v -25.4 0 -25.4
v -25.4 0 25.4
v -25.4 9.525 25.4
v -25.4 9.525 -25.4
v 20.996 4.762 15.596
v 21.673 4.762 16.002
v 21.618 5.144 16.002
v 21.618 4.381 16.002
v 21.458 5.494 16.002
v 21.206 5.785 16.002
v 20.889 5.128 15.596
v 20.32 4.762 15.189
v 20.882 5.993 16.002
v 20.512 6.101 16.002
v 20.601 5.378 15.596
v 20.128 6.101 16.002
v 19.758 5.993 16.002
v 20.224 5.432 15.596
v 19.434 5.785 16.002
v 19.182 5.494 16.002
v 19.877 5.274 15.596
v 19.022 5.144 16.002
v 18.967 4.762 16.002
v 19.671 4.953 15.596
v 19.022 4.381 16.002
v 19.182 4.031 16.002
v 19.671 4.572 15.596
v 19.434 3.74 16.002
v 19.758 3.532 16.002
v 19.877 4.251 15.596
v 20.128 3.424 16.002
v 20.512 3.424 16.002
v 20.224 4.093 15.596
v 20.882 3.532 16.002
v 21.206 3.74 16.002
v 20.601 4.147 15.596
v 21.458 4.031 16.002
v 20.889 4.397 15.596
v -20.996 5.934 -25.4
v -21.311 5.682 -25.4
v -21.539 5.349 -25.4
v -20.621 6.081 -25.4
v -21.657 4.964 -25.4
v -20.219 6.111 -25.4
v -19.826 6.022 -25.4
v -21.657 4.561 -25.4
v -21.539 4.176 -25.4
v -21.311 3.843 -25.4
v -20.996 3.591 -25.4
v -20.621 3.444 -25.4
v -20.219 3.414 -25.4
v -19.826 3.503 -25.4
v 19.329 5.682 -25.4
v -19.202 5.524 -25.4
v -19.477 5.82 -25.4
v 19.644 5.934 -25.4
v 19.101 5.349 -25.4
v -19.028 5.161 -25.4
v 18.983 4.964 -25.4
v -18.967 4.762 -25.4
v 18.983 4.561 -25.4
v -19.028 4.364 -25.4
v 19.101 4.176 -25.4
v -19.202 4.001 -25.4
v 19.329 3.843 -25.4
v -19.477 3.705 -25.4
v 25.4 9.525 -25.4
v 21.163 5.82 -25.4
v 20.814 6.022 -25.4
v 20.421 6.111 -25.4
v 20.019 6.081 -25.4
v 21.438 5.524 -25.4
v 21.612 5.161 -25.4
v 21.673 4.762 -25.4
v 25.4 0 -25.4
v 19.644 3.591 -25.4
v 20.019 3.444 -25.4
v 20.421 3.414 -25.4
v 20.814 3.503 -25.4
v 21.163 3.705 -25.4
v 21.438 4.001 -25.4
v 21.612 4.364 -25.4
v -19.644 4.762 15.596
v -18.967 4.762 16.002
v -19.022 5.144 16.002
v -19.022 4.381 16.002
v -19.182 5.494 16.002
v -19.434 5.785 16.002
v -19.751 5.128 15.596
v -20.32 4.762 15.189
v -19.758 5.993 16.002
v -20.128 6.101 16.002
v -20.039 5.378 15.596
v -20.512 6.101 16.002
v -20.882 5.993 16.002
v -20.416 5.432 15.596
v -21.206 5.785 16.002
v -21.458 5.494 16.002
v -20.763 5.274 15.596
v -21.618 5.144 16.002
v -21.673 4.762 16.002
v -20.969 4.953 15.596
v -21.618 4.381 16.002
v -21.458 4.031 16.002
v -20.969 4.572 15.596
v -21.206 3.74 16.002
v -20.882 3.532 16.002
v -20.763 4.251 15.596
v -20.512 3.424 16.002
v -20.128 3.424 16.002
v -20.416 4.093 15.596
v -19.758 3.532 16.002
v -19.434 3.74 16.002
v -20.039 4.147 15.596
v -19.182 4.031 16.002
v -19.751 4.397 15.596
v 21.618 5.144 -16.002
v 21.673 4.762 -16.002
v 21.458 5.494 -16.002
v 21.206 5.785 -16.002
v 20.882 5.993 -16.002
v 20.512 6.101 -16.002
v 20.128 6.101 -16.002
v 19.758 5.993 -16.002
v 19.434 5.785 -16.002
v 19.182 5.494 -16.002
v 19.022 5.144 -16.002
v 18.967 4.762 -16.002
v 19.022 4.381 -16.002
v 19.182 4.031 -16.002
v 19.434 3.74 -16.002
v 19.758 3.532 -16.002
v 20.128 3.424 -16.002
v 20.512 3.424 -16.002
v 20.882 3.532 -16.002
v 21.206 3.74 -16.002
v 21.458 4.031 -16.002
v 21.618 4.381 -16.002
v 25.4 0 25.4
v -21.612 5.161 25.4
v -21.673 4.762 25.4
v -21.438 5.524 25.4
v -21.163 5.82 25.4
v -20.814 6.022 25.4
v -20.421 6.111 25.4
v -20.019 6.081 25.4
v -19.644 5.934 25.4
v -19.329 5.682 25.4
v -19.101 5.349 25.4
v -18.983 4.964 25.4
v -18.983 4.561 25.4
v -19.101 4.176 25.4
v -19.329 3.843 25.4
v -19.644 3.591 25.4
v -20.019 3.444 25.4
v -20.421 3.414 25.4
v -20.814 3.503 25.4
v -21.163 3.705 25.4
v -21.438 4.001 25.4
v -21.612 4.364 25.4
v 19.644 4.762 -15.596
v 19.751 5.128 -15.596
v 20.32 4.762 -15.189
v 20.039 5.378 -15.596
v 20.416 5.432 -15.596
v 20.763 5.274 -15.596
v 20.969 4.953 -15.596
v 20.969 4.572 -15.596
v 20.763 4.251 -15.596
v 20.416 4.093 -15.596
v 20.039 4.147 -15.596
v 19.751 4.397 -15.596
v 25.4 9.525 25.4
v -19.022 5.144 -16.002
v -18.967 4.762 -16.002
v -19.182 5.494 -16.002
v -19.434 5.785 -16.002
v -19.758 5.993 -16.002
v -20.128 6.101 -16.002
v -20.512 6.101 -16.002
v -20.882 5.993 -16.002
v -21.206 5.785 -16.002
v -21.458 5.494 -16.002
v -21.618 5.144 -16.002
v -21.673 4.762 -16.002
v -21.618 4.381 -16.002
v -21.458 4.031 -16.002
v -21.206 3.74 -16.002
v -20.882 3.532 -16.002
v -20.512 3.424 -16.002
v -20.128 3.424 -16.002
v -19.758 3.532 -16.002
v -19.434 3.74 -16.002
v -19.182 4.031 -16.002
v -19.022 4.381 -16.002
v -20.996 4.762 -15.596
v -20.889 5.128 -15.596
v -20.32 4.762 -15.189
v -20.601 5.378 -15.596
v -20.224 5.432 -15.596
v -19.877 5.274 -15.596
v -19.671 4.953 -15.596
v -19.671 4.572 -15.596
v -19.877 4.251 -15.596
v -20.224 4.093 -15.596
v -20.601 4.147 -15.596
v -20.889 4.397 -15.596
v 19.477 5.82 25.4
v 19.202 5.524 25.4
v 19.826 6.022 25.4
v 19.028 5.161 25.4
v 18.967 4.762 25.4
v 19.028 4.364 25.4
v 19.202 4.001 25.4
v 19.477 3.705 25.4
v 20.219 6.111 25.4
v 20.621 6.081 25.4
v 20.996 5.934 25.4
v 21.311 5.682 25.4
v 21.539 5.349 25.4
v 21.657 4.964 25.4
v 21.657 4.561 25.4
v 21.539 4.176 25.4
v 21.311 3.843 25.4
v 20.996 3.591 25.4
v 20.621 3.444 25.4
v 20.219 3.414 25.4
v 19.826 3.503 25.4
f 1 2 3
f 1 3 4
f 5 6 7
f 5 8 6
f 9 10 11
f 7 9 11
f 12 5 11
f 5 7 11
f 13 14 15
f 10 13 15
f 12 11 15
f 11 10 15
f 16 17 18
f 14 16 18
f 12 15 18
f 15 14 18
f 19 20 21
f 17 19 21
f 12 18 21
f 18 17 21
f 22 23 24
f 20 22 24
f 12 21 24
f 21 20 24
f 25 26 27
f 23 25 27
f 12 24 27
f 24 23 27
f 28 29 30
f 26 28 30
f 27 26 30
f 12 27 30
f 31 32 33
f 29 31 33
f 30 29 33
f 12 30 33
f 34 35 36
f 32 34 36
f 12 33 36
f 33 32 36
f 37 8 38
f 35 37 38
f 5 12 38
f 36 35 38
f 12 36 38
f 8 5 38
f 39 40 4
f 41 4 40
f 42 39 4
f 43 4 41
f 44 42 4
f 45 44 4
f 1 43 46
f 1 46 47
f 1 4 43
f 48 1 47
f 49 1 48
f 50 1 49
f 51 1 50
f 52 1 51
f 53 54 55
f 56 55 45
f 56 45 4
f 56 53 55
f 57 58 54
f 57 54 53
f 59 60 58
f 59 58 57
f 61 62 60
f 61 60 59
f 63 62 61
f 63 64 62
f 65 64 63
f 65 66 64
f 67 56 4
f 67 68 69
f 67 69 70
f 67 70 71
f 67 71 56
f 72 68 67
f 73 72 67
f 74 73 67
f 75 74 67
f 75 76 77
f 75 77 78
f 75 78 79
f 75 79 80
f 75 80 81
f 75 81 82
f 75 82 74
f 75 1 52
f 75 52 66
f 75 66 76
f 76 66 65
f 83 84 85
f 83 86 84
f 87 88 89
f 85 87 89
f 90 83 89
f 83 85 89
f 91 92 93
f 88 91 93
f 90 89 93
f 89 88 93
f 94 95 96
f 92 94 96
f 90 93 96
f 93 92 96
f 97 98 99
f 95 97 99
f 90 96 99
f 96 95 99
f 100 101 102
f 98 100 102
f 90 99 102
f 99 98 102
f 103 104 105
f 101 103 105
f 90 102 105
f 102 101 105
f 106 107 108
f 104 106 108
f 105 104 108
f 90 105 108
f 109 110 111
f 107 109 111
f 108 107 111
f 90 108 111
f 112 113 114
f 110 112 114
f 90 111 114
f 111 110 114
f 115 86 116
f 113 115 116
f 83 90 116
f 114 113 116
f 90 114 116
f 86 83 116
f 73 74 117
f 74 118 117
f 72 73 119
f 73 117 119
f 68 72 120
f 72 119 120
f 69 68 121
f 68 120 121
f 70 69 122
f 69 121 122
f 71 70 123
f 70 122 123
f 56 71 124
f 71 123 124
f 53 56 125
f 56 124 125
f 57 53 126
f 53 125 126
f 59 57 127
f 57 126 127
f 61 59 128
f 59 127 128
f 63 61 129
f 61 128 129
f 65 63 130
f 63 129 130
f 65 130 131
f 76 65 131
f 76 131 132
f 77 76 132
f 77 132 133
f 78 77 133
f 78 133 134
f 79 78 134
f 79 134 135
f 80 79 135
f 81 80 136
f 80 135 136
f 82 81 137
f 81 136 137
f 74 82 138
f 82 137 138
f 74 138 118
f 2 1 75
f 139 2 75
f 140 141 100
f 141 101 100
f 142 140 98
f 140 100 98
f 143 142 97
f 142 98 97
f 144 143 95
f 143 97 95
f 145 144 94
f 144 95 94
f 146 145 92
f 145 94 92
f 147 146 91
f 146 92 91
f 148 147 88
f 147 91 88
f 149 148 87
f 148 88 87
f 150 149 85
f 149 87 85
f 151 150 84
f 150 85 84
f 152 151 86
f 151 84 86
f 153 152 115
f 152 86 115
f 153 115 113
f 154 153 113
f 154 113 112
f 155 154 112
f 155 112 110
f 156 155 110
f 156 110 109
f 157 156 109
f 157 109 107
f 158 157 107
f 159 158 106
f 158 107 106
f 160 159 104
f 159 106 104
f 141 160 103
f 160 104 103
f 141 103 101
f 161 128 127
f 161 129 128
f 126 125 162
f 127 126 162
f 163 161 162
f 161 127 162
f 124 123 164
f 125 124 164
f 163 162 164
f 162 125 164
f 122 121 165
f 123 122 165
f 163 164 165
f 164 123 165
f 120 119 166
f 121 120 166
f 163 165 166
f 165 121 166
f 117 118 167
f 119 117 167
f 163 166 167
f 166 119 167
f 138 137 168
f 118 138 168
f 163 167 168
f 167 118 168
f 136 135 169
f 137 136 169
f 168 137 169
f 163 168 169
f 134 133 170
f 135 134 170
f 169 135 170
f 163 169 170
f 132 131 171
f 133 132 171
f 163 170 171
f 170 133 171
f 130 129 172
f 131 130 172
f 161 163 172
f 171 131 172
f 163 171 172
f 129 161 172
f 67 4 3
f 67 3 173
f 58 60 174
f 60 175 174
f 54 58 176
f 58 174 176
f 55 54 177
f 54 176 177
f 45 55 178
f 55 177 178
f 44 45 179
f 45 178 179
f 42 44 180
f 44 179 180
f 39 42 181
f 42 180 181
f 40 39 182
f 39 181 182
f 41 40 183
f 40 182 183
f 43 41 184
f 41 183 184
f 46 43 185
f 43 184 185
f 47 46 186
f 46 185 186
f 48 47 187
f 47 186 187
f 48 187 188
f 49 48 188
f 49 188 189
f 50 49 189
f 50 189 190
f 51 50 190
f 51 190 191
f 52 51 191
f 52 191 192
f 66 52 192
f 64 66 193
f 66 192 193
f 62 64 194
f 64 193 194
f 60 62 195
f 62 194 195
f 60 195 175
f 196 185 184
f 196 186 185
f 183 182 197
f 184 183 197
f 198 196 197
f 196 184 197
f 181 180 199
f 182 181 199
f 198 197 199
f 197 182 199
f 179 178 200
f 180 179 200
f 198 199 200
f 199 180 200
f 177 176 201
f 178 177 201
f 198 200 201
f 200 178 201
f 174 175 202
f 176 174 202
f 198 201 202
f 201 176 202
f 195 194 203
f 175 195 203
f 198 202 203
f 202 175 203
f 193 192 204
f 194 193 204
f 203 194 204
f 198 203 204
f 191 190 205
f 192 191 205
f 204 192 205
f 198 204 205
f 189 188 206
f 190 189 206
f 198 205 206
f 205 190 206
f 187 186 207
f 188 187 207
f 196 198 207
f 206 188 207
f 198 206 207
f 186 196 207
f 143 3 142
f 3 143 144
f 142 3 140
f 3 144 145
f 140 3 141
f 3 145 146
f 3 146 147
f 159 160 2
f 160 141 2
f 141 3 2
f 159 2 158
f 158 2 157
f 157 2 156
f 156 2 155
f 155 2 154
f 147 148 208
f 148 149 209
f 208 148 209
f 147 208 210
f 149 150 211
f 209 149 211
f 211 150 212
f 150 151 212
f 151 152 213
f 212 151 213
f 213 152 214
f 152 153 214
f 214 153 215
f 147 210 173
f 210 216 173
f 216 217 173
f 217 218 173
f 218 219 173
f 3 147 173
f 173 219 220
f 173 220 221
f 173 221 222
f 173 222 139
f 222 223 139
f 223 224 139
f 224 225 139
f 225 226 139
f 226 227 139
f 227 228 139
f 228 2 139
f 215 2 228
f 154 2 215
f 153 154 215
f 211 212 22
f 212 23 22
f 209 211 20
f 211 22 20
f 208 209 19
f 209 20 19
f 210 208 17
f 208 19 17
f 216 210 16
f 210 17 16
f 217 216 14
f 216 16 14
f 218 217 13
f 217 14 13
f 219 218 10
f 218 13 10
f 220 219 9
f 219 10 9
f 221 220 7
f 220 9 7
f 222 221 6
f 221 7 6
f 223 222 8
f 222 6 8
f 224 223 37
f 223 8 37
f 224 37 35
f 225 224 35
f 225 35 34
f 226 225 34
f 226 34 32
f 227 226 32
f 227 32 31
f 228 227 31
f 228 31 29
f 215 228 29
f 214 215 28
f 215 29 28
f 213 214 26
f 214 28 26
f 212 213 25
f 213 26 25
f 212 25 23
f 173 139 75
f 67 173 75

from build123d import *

# Parameters (mm, degrees)
SKETCH2_W                 = 50.8
SKETCH2_H                 = 50.8
BOSS_EXTRUDE1_DEPTH       = 9.525
F_6_32_TAPPED_HOLE1_D     = 2.7051
F_6_32_TAPPED_HOLE1_DEPTH = 9.398
F_6_32_TAPPED_HOLE1_TIP   = 0.81269403
F_6_32_TAPPED_HOLE2_D     = 2.7051
F_6_32_TAPPED_HOLE2_DEPTH = 9.398
F_6_32_TAPPED_HOLE2_TIP   = 0.81269403


with BuildPart() as part:
    # Sketch2 → Boss-Extrude1 (new body)
    with BuildSketch(Plane(origin=(0, 0, 0), x_dir=(1, 0, 0), z_dir=(0, 1, 0))):
        Rectangle(SKETCH2_W, SKETCH2_H)
    extrude(amount=BOSS_EXTRUDE1_DEPTH)

    # #6-32 Tapped Hole1
    with Locations(Plane.XY.offset(25.4)):
        with Locations((-20.32, 4.7625), (20.32, 4.7625)):
            Hole(F_6_32_TAPPED_HOLE1_D / 2, depth=F_6_32_TAPPED_HOLE1_DEPTH)
            with Locations((0, 0, -(F_6_32_TAPPED_HOLE1_DEPTH + F_6_32_TAPPED_HOLE1_TIP / 2))):  # 118° drill point
                Cone(0, F_6_32_TAPPED_HOLE1_D / 2, F_6_32_TAPPED_HOLE1_TIP, mode=Mode.SUBTRACT)

    # #6-32 Tapped Hole2
    with Locations(Plane(origin=(0, 0, -25.4), x_dir=(-1, 0, 0), z_dir=(0, 0, -1))):
        with Locations((-20.32, 4.7625), (20.32, 4.7625)):
            Hole(F_6_32_TAPPED_HOLE2_D / 2, depth=F_6_32_TAPPED_HOLE2_DEPTH)
            with Locations((0, 0, -(F_6_32_TAPPED_HOLE2_DEPTH + F_6_32_TAPPED_HOLE2_TIP / 2))):  # 118° drill point
                Cone(0, F_6_32_TAPPED_HOLE2_D / 2, F_6_32_TAPPED_HOLE2_TIP, mode=Mode.SUBTRACT)


solid = part.part
